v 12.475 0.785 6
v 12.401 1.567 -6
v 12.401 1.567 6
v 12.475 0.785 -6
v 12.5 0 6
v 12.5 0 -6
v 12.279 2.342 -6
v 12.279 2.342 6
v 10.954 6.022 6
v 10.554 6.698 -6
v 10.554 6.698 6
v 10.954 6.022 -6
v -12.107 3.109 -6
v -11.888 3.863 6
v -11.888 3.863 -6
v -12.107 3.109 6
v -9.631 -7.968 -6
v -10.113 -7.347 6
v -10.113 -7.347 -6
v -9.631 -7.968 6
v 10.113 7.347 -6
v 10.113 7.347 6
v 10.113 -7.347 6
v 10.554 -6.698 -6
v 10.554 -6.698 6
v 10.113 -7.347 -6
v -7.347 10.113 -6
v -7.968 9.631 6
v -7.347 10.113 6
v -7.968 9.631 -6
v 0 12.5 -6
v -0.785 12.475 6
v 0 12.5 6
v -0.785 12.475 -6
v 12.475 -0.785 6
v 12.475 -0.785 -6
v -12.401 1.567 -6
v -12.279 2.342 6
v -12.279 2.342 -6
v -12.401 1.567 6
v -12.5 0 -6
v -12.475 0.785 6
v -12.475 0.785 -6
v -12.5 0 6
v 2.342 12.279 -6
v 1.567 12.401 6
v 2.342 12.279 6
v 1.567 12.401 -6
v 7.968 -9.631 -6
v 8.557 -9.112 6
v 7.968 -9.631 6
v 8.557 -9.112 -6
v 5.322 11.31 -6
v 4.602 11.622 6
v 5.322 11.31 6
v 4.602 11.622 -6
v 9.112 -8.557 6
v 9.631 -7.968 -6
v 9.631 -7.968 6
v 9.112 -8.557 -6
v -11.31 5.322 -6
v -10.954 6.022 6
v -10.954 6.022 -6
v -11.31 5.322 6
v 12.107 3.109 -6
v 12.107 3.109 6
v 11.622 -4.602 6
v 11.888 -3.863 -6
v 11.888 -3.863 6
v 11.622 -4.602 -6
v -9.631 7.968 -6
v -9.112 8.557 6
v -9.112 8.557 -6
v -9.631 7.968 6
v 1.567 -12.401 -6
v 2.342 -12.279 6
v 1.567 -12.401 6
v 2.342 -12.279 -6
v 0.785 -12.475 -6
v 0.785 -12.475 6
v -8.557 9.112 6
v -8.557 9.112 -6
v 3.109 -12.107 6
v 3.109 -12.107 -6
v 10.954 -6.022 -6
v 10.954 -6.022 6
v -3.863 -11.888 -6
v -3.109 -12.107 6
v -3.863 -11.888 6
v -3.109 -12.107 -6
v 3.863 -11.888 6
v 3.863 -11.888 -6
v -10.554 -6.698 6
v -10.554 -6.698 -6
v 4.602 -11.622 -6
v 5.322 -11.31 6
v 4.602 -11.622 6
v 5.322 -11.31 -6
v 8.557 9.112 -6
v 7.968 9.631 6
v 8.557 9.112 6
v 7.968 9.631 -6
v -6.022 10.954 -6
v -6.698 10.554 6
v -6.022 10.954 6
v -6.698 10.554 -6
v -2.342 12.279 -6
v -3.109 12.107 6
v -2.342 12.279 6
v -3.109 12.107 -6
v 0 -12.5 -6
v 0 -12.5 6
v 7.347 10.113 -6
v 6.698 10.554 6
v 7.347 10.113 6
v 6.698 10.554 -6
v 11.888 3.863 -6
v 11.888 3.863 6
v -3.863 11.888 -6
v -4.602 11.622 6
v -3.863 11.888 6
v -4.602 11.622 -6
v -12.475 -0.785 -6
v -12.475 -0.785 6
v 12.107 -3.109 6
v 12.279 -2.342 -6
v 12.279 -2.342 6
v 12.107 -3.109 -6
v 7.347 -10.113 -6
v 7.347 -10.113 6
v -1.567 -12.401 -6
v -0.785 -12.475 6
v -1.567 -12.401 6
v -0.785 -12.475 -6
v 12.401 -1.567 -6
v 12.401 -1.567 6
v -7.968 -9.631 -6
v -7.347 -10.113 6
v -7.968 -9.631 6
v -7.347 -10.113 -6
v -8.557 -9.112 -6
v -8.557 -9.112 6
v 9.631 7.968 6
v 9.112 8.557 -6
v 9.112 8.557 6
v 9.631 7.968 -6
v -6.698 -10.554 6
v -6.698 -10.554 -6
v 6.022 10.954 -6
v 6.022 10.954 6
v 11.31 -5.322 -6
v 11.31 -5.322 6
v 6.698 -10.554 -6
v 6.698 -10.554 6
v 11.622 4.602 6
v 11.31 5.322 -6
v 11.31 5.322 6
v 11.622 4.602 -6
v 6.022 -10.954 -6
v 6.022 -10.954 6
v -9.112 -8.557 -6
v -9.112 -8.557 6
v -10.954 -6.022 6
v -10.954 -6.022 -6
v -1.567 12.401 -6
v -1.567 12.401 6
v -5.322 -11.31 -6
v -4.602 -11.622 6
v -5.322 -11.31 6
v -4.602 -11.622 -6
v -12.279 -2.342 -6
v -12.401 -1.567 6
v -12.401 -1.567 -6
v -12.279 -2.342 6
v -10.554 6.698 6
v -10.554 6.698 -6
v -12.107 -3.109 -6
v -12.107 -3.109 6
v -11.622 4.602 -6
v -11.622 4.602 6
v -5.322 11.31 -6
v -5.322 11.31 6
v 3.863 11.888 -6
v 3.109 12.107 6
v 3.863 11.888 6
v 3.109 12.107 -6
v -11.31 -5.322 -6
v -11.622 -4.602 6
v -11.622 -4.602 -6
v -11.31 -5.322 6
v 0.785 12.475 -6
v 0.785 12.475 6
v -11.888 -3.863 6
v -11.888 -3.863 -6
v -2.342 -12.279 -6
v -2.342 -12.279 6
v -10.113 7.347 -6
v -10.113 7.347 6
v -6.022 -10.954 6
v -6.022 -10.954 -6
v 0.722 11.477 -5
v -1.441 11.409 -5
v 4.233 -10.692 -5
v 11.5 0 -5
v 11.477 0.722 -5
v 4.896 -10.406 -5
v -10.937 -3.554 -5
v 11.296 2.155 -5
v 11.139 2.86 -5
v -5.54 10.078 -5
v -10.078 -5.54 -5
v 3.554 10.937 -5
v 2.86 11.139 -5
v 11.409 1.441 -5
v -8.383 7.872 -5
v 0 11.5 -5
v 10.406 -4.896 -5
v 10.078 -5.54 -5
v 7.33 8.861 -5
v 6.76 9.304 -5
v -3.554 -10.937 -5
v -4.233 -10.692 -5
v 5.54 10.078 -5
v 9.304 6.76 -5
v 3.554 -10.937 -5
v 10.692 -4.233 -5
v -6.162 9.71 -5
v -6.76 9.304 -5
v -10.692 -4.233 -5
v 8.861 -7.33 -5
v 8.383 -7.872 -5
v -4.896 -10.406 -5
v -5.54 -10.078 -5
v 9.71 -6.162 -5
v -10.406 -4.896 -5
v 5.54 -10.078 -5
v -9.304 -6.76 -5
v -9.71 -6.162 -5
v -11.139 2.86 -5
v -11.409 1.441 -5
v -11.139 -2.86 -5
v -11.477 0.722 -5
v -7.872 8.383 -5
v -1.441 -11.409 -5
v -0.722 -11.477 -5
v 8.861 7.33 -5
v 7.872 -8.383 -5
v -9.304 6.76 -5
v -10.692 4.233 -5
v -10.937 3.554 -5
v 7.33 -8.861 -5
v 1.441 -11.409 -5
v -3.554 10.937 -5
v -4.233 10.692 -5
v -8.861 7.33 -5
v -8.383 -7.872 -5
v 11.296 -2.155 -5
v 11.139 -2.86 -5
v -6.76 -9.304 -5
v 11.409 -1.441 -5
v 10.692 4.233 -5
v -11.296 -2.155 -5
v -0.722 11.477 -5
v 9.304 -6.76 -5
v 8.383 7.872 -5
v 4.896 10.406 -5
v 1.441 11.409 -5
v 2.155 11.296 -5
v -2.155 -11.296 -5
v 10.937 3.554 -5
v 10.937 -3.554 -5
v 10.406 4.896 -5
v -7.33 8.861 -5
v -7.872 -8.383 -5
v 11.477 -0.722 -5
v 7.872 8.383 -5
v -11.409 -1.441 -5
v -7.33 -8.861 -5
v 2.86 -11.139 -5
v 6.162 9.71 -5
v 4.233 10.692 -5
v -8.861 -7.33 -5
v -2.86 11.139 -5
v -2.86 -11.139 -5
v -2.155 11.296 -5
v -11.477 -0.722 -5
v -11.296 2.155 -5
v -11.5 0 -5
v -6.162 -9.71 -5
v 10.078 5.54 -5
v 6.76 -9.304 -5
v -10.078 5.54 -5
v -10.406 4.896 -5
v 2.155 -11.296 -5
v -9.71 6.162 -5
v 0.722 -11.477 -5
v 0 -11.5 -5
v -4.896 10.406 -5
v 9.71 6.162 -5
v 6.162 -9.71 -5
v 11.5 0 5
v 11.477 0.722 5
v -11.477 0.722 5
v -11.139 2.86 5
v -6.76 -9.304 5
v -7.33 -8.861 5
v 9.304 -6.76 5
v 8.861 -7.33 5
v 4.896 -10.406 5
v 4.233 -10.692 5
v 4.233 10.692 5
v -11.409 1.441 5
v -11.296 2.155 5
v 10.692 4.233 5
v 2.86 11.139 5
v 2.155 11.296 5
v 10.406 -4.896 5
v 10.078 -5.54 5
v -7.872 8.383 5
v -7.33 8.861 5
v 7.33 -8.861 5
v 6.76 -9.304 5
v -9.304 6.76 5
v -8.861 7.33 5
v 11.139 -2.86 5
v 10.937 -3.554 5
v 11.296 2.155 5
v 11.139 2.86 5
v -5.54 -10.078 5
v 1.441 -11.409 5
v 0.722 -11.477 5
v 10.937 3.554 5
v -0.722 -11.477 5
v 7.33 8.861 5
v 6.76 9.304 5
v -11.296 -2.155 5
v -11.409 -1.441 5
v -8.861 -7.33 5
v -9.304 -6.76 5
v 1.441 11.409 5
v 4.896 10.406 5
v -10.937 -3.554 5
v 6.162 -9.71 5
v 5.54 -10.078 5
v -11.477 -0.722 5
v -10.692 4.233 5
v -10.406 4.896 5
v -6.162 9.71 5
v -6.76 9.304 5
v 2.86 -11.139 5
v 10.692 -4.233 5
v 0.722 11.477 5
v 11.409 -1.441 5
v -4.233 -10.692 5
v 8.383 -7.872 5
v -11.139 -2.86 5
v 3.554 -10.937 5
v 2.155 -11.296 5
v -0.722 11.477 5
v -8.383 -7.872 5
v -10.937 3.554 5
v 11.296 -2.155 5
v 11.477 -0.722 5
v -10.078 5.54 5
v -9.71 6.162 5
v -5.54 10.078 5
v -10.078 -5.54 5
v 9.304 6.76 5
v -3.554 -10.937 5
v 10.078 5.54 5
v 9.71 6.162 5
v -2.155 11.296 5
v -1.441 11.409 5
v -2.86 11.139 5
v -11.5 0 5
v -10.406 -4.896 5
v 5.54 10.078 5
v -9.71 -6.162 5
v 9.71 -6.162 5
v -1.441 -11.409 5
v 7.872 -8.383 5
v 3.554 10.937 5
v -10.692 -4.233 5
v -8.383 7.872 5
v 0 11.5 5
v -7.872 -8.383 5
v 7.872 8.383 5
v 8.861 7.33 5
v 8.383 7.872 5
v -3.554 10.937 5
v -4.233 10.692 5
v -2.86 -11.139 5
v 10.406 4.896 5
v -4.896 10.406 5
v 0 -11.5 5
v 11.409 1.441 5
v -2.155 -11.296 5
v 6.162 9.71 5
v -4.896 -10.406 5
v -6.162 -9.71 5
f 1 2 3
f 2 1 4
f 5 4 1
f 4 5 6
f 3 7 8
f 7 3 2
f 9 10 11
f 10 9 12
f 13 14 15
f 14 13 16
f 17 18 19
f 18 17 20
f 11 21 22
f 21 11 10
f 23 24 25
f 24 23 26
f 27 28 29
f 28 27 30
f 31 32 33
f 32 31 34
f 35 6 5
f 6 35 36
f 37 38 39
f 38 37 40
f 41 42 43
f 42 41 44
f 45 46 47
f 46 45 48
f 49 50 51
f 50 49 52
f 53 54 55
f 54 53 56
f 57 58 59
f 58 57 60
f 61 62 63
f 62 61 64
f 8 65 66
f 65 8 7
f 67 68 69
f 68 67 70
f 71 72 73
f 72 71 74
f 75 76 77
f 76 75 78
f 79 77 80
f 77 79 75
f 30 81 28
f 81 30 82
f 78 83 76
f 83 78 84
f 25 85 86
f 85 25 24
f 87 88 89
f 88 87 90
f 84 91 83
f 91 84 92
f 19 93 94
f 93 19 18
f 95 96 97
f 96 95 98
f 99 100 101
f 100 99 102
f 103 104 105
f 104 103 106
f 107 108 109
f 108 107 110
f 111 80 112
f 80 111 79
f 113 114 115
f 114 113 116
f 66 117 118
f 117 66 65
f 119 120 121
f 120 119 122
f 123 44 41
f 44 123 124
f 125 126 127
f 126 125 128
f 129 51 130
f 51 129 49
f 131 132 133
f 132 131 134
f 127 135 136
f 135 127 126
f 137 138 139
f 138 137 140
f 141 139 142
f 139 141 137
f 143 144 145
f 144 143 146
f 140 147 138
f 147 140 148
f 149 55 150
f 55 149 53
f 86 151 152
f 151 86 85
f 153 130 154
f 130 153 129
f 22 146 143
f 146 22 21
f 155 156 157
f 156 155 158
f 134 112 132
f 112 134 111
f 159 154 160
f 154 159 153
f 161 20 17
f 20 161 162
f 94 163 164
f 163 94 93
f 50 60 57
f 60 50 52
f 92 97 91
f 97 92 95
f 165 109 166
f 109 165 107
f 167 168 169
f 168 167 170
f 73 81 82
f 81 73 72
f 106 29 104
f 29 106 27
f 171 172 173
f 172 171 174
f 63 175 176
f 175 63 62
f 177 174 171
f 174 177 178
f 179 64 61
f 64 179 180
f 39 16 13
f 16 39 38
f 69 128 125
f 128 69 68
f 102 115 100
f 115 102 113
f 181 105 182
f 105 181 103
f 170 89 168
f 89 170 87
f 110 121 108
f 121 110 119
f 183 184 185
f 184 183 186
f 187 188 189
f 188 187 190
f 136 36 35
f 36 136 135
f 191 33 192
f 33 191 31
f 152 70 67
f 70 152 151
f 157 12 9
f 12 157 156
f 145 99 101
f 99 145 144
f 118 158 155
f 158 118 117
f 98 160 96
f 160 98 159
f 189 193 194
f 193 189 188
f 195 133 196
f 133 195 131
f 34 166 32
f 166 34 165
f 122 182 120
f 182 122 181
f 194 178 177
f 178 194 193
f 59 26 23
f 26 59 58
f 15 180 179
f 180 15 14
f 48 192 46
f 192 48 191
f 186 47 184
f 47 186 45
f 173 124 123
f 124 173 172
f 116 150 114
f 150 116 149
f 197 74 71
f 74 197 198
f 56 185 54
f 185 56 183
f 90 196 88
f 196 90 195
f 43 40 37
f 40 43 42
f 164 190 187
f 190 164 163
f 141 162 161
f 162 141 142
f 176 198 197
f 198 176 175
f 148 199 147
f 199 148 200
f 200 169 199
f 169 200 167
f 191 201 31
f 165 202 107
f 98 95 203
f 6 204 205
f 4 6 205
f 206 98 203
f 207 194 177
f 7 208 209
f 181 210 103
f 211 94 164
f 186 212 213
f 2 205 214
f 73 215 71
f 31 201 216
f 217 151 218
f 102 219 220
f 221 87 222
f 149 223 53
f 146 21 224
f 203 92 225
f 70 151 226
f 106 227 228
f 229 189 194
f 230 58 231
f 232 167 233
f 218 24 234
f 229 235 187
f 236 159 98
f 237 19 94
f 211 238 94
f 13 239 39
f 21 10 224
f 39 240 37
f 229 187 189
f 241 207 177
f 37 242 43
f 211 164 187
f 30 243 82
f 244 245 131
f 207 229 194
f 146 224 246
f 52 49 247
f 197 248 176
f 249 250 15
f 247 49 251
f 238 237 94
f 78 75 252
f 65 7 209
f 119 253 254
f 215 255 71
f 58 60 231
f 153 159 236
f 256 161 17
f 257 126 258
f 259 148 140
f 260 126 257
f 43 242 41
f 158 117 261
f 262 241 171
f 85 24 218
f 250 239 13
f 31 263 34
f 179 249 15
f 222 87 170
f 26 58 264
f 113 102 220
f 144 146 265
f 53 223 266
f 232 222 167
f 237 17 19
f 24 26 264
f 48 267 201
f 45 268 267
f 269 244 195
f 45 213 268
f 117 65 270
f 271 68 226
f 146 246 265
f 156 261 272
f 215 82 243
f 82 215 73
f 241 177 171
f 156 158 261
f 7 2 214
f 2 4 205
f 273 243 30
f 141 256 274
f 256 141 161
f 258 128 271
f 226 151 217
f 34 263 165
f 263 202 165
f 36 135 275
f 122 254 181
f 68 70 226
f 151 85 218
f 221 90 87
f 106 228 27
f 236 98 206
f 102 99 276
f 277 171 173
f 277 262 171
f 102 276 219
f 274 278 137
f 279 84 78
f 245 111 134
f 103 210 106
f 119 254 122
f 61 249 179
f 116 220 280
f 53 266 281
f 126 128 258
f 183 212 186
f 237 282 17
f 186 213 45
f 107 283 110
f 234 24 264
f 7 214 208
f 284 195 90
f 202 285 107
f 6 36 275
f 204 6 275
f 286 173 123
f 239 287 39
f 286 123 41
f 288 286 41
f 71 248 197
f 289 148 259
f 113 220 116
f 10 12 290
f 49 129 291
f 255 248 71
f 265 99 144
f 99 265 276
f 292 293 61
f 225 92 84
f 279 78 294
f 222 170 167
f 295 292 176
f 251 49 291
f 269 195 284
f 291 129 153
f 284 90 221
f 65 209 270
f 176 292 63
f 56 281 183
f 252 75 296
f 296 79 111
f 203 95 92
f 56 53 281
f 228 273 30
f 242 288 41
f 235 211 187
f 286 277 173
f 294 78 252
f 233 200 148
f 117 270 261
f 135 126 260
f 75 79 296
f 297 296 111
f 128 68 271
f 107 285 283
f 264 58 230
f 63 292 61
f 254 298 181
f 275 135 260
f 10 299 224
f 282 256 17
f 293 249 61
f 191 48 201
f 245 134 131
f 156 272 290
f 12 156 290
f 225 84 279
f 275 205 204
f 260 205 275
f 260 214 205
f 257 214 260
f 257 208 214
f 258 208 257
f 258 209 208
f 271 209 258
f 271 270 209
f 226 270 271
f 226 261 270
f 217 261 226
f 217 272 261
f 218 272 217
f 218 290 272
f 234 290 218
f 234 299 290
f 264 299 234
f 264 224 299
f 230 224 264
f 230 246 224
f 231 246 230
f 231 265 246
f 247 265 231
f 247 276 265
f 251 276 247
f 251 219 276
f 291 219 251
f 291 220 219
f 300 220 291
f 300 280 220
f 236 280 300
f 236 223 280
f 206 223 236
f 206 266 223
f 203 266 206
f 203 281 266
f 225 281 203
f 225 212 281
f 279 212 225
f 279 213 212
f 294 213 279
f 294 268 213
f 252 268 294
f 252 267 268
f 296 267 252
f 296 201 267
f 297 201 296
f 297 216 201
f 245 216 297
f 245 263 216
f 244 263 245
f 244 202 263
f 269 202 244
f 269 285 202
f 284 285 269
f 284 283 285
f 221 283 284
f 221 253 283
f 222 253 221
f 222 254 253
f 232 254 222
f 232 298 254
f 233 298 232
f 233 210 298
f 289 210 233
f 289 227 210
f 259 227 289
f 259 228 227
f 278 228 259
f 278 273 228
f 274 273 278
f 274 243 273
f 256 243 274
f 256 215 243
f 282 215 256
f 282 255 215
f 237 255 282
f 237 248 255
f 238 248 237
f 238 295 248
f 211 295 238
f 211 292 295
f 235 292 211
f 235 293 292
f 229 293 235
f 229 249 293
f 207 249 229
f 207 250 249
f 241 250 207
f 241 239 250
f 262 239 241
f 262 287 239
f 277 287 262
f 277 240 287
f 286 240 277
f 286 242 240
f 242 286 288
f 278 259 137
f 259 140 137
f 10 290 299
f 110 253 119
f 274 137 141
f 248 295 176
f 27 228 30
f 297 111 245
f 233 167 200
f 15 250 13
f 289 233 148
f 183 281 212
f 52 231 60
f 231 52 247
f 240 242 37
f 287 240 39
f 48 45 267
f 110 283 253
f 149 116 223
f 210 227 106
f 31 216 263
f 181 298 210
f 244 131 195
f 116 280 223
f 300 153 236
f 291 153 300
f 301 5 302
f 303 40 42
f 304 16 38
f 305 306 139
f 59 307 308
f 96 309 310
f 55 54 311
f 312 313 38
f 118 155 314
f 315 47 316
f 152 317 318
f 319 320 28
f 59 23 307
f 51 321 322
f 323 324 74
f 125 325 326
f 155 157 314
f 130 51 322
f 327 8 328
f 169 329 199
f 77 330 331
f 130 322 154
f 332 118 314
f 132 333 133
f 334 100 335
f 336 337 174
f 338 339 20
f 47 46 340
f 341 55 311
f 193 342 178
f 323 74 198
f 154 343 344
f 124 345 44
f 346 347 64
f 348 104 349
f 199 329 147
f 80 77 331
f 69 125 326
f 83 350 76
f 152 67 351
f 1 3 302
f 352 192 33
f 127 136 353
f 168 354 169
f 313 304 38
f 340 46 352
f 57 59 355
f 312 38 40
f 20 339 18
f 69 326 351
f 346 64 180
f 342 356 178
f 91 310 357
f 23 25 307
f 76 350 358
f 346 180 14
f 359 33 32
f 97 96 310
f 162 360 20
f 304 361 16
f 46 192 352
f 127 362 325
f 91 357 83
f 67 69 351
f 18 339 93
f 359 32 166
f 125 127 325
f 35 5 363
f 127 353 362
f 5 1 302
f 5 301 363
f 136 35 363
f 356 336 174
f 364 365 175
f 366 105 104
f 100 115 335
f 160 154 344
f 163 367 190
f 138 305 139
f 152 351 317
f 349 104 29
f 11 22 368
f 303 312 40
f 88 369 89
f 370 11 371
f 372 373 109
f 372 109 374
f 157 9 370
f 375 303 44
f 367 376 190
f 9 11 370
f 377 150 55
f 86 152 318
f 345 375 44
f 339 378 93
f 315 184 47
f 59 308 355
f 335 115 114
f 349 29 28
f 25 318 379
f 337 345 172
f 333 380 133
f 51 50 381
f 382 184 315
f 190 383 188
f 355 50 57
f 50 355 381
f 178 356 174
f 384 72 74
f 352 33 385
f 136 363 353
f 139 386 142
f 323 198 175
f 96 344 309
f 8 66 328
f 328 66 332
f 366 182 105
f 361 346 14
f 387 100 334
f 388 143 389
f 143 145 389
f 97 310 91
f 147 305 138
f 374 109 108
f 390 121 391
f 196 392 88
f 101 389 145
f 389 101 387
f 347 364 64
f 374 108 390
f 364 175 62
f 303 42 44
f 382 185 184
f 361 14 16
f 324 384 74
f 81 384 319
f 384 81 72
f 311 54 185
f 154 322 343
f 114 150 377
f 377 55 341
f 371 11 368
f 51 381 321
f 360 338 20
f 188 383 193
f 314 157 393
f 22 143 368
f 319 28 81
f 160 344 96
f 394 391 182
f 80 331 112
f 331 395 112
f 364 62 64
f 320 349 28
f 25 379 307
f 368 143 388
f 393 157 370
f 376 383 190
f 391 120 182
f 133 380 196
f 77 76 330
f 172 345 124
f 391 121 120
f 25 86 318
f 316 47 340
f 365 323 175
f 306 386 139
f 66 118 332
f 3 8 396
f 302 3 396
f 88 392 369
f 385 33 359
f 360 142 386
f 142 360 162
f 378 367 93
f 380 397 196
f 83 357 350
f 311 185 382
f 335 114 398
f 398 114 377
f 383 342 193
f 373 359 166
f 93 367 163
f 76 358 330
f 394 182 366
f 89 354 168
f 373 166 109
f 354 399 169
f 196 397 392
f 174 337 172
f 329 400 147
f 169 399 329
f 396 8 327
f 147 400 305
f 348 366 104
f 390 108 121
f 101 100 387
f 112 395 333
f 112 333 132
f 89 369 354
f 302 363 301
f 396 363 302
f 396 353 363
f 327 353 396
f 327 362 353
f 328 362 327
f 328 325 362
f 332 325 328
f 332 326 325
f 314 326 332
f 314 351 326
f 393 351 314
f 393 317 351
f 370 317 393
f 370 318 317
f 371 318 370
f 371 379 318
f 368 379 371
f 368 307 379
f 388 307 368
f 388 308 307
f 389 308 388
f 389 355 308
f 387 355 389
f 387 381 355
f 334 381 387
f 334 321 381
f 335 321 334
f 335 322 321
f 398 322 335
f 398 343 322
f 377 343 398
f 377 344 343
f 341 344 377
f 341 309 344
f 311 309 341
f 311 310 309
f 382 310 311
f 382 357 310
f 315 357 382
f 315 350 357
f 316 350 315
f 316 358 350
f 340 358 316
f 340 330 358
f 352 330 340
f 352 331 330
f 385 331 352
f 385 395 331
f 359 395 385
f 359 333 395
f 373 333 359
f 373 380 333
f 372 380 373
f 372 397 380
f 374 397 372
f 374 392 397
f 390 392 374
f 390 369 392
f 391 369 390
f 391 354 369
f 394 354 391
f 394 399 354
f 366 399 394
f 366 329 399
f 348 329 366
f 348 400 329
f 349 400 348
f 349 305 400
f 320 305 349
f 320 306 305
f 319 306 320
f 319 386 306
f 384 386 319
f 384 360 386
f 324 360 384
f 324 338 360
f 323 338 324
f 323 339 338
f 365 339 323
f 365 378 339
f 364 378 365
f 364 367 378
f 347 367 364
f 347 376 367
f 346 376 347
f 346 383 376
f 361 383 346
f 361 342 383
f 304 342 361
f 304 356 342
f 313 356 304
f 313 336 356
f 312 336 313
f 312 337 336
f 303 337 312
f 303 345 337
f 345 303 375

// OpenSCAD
$fn = 100; // Smoothness

module hockey_puck(diameter = 25, height = 12, chamfer = 1) {
    difference() {
        cylinder(d = diameter, h = height, center = true);
        // Chamfer bottom
        translate([0, 0, -height/2]) 
            cylinder(d1 = diameter, d2 = diameter - 2*chamfer, h = chamfer, center = false);
        // Chamfer top
        translate([0, 0, height/2 - chamfer]) 
            cylinder(d1 = diameter - 2*chamfer, d2 = diameter, h = chamfer, center = false);
    }
}

hockey_puck();
